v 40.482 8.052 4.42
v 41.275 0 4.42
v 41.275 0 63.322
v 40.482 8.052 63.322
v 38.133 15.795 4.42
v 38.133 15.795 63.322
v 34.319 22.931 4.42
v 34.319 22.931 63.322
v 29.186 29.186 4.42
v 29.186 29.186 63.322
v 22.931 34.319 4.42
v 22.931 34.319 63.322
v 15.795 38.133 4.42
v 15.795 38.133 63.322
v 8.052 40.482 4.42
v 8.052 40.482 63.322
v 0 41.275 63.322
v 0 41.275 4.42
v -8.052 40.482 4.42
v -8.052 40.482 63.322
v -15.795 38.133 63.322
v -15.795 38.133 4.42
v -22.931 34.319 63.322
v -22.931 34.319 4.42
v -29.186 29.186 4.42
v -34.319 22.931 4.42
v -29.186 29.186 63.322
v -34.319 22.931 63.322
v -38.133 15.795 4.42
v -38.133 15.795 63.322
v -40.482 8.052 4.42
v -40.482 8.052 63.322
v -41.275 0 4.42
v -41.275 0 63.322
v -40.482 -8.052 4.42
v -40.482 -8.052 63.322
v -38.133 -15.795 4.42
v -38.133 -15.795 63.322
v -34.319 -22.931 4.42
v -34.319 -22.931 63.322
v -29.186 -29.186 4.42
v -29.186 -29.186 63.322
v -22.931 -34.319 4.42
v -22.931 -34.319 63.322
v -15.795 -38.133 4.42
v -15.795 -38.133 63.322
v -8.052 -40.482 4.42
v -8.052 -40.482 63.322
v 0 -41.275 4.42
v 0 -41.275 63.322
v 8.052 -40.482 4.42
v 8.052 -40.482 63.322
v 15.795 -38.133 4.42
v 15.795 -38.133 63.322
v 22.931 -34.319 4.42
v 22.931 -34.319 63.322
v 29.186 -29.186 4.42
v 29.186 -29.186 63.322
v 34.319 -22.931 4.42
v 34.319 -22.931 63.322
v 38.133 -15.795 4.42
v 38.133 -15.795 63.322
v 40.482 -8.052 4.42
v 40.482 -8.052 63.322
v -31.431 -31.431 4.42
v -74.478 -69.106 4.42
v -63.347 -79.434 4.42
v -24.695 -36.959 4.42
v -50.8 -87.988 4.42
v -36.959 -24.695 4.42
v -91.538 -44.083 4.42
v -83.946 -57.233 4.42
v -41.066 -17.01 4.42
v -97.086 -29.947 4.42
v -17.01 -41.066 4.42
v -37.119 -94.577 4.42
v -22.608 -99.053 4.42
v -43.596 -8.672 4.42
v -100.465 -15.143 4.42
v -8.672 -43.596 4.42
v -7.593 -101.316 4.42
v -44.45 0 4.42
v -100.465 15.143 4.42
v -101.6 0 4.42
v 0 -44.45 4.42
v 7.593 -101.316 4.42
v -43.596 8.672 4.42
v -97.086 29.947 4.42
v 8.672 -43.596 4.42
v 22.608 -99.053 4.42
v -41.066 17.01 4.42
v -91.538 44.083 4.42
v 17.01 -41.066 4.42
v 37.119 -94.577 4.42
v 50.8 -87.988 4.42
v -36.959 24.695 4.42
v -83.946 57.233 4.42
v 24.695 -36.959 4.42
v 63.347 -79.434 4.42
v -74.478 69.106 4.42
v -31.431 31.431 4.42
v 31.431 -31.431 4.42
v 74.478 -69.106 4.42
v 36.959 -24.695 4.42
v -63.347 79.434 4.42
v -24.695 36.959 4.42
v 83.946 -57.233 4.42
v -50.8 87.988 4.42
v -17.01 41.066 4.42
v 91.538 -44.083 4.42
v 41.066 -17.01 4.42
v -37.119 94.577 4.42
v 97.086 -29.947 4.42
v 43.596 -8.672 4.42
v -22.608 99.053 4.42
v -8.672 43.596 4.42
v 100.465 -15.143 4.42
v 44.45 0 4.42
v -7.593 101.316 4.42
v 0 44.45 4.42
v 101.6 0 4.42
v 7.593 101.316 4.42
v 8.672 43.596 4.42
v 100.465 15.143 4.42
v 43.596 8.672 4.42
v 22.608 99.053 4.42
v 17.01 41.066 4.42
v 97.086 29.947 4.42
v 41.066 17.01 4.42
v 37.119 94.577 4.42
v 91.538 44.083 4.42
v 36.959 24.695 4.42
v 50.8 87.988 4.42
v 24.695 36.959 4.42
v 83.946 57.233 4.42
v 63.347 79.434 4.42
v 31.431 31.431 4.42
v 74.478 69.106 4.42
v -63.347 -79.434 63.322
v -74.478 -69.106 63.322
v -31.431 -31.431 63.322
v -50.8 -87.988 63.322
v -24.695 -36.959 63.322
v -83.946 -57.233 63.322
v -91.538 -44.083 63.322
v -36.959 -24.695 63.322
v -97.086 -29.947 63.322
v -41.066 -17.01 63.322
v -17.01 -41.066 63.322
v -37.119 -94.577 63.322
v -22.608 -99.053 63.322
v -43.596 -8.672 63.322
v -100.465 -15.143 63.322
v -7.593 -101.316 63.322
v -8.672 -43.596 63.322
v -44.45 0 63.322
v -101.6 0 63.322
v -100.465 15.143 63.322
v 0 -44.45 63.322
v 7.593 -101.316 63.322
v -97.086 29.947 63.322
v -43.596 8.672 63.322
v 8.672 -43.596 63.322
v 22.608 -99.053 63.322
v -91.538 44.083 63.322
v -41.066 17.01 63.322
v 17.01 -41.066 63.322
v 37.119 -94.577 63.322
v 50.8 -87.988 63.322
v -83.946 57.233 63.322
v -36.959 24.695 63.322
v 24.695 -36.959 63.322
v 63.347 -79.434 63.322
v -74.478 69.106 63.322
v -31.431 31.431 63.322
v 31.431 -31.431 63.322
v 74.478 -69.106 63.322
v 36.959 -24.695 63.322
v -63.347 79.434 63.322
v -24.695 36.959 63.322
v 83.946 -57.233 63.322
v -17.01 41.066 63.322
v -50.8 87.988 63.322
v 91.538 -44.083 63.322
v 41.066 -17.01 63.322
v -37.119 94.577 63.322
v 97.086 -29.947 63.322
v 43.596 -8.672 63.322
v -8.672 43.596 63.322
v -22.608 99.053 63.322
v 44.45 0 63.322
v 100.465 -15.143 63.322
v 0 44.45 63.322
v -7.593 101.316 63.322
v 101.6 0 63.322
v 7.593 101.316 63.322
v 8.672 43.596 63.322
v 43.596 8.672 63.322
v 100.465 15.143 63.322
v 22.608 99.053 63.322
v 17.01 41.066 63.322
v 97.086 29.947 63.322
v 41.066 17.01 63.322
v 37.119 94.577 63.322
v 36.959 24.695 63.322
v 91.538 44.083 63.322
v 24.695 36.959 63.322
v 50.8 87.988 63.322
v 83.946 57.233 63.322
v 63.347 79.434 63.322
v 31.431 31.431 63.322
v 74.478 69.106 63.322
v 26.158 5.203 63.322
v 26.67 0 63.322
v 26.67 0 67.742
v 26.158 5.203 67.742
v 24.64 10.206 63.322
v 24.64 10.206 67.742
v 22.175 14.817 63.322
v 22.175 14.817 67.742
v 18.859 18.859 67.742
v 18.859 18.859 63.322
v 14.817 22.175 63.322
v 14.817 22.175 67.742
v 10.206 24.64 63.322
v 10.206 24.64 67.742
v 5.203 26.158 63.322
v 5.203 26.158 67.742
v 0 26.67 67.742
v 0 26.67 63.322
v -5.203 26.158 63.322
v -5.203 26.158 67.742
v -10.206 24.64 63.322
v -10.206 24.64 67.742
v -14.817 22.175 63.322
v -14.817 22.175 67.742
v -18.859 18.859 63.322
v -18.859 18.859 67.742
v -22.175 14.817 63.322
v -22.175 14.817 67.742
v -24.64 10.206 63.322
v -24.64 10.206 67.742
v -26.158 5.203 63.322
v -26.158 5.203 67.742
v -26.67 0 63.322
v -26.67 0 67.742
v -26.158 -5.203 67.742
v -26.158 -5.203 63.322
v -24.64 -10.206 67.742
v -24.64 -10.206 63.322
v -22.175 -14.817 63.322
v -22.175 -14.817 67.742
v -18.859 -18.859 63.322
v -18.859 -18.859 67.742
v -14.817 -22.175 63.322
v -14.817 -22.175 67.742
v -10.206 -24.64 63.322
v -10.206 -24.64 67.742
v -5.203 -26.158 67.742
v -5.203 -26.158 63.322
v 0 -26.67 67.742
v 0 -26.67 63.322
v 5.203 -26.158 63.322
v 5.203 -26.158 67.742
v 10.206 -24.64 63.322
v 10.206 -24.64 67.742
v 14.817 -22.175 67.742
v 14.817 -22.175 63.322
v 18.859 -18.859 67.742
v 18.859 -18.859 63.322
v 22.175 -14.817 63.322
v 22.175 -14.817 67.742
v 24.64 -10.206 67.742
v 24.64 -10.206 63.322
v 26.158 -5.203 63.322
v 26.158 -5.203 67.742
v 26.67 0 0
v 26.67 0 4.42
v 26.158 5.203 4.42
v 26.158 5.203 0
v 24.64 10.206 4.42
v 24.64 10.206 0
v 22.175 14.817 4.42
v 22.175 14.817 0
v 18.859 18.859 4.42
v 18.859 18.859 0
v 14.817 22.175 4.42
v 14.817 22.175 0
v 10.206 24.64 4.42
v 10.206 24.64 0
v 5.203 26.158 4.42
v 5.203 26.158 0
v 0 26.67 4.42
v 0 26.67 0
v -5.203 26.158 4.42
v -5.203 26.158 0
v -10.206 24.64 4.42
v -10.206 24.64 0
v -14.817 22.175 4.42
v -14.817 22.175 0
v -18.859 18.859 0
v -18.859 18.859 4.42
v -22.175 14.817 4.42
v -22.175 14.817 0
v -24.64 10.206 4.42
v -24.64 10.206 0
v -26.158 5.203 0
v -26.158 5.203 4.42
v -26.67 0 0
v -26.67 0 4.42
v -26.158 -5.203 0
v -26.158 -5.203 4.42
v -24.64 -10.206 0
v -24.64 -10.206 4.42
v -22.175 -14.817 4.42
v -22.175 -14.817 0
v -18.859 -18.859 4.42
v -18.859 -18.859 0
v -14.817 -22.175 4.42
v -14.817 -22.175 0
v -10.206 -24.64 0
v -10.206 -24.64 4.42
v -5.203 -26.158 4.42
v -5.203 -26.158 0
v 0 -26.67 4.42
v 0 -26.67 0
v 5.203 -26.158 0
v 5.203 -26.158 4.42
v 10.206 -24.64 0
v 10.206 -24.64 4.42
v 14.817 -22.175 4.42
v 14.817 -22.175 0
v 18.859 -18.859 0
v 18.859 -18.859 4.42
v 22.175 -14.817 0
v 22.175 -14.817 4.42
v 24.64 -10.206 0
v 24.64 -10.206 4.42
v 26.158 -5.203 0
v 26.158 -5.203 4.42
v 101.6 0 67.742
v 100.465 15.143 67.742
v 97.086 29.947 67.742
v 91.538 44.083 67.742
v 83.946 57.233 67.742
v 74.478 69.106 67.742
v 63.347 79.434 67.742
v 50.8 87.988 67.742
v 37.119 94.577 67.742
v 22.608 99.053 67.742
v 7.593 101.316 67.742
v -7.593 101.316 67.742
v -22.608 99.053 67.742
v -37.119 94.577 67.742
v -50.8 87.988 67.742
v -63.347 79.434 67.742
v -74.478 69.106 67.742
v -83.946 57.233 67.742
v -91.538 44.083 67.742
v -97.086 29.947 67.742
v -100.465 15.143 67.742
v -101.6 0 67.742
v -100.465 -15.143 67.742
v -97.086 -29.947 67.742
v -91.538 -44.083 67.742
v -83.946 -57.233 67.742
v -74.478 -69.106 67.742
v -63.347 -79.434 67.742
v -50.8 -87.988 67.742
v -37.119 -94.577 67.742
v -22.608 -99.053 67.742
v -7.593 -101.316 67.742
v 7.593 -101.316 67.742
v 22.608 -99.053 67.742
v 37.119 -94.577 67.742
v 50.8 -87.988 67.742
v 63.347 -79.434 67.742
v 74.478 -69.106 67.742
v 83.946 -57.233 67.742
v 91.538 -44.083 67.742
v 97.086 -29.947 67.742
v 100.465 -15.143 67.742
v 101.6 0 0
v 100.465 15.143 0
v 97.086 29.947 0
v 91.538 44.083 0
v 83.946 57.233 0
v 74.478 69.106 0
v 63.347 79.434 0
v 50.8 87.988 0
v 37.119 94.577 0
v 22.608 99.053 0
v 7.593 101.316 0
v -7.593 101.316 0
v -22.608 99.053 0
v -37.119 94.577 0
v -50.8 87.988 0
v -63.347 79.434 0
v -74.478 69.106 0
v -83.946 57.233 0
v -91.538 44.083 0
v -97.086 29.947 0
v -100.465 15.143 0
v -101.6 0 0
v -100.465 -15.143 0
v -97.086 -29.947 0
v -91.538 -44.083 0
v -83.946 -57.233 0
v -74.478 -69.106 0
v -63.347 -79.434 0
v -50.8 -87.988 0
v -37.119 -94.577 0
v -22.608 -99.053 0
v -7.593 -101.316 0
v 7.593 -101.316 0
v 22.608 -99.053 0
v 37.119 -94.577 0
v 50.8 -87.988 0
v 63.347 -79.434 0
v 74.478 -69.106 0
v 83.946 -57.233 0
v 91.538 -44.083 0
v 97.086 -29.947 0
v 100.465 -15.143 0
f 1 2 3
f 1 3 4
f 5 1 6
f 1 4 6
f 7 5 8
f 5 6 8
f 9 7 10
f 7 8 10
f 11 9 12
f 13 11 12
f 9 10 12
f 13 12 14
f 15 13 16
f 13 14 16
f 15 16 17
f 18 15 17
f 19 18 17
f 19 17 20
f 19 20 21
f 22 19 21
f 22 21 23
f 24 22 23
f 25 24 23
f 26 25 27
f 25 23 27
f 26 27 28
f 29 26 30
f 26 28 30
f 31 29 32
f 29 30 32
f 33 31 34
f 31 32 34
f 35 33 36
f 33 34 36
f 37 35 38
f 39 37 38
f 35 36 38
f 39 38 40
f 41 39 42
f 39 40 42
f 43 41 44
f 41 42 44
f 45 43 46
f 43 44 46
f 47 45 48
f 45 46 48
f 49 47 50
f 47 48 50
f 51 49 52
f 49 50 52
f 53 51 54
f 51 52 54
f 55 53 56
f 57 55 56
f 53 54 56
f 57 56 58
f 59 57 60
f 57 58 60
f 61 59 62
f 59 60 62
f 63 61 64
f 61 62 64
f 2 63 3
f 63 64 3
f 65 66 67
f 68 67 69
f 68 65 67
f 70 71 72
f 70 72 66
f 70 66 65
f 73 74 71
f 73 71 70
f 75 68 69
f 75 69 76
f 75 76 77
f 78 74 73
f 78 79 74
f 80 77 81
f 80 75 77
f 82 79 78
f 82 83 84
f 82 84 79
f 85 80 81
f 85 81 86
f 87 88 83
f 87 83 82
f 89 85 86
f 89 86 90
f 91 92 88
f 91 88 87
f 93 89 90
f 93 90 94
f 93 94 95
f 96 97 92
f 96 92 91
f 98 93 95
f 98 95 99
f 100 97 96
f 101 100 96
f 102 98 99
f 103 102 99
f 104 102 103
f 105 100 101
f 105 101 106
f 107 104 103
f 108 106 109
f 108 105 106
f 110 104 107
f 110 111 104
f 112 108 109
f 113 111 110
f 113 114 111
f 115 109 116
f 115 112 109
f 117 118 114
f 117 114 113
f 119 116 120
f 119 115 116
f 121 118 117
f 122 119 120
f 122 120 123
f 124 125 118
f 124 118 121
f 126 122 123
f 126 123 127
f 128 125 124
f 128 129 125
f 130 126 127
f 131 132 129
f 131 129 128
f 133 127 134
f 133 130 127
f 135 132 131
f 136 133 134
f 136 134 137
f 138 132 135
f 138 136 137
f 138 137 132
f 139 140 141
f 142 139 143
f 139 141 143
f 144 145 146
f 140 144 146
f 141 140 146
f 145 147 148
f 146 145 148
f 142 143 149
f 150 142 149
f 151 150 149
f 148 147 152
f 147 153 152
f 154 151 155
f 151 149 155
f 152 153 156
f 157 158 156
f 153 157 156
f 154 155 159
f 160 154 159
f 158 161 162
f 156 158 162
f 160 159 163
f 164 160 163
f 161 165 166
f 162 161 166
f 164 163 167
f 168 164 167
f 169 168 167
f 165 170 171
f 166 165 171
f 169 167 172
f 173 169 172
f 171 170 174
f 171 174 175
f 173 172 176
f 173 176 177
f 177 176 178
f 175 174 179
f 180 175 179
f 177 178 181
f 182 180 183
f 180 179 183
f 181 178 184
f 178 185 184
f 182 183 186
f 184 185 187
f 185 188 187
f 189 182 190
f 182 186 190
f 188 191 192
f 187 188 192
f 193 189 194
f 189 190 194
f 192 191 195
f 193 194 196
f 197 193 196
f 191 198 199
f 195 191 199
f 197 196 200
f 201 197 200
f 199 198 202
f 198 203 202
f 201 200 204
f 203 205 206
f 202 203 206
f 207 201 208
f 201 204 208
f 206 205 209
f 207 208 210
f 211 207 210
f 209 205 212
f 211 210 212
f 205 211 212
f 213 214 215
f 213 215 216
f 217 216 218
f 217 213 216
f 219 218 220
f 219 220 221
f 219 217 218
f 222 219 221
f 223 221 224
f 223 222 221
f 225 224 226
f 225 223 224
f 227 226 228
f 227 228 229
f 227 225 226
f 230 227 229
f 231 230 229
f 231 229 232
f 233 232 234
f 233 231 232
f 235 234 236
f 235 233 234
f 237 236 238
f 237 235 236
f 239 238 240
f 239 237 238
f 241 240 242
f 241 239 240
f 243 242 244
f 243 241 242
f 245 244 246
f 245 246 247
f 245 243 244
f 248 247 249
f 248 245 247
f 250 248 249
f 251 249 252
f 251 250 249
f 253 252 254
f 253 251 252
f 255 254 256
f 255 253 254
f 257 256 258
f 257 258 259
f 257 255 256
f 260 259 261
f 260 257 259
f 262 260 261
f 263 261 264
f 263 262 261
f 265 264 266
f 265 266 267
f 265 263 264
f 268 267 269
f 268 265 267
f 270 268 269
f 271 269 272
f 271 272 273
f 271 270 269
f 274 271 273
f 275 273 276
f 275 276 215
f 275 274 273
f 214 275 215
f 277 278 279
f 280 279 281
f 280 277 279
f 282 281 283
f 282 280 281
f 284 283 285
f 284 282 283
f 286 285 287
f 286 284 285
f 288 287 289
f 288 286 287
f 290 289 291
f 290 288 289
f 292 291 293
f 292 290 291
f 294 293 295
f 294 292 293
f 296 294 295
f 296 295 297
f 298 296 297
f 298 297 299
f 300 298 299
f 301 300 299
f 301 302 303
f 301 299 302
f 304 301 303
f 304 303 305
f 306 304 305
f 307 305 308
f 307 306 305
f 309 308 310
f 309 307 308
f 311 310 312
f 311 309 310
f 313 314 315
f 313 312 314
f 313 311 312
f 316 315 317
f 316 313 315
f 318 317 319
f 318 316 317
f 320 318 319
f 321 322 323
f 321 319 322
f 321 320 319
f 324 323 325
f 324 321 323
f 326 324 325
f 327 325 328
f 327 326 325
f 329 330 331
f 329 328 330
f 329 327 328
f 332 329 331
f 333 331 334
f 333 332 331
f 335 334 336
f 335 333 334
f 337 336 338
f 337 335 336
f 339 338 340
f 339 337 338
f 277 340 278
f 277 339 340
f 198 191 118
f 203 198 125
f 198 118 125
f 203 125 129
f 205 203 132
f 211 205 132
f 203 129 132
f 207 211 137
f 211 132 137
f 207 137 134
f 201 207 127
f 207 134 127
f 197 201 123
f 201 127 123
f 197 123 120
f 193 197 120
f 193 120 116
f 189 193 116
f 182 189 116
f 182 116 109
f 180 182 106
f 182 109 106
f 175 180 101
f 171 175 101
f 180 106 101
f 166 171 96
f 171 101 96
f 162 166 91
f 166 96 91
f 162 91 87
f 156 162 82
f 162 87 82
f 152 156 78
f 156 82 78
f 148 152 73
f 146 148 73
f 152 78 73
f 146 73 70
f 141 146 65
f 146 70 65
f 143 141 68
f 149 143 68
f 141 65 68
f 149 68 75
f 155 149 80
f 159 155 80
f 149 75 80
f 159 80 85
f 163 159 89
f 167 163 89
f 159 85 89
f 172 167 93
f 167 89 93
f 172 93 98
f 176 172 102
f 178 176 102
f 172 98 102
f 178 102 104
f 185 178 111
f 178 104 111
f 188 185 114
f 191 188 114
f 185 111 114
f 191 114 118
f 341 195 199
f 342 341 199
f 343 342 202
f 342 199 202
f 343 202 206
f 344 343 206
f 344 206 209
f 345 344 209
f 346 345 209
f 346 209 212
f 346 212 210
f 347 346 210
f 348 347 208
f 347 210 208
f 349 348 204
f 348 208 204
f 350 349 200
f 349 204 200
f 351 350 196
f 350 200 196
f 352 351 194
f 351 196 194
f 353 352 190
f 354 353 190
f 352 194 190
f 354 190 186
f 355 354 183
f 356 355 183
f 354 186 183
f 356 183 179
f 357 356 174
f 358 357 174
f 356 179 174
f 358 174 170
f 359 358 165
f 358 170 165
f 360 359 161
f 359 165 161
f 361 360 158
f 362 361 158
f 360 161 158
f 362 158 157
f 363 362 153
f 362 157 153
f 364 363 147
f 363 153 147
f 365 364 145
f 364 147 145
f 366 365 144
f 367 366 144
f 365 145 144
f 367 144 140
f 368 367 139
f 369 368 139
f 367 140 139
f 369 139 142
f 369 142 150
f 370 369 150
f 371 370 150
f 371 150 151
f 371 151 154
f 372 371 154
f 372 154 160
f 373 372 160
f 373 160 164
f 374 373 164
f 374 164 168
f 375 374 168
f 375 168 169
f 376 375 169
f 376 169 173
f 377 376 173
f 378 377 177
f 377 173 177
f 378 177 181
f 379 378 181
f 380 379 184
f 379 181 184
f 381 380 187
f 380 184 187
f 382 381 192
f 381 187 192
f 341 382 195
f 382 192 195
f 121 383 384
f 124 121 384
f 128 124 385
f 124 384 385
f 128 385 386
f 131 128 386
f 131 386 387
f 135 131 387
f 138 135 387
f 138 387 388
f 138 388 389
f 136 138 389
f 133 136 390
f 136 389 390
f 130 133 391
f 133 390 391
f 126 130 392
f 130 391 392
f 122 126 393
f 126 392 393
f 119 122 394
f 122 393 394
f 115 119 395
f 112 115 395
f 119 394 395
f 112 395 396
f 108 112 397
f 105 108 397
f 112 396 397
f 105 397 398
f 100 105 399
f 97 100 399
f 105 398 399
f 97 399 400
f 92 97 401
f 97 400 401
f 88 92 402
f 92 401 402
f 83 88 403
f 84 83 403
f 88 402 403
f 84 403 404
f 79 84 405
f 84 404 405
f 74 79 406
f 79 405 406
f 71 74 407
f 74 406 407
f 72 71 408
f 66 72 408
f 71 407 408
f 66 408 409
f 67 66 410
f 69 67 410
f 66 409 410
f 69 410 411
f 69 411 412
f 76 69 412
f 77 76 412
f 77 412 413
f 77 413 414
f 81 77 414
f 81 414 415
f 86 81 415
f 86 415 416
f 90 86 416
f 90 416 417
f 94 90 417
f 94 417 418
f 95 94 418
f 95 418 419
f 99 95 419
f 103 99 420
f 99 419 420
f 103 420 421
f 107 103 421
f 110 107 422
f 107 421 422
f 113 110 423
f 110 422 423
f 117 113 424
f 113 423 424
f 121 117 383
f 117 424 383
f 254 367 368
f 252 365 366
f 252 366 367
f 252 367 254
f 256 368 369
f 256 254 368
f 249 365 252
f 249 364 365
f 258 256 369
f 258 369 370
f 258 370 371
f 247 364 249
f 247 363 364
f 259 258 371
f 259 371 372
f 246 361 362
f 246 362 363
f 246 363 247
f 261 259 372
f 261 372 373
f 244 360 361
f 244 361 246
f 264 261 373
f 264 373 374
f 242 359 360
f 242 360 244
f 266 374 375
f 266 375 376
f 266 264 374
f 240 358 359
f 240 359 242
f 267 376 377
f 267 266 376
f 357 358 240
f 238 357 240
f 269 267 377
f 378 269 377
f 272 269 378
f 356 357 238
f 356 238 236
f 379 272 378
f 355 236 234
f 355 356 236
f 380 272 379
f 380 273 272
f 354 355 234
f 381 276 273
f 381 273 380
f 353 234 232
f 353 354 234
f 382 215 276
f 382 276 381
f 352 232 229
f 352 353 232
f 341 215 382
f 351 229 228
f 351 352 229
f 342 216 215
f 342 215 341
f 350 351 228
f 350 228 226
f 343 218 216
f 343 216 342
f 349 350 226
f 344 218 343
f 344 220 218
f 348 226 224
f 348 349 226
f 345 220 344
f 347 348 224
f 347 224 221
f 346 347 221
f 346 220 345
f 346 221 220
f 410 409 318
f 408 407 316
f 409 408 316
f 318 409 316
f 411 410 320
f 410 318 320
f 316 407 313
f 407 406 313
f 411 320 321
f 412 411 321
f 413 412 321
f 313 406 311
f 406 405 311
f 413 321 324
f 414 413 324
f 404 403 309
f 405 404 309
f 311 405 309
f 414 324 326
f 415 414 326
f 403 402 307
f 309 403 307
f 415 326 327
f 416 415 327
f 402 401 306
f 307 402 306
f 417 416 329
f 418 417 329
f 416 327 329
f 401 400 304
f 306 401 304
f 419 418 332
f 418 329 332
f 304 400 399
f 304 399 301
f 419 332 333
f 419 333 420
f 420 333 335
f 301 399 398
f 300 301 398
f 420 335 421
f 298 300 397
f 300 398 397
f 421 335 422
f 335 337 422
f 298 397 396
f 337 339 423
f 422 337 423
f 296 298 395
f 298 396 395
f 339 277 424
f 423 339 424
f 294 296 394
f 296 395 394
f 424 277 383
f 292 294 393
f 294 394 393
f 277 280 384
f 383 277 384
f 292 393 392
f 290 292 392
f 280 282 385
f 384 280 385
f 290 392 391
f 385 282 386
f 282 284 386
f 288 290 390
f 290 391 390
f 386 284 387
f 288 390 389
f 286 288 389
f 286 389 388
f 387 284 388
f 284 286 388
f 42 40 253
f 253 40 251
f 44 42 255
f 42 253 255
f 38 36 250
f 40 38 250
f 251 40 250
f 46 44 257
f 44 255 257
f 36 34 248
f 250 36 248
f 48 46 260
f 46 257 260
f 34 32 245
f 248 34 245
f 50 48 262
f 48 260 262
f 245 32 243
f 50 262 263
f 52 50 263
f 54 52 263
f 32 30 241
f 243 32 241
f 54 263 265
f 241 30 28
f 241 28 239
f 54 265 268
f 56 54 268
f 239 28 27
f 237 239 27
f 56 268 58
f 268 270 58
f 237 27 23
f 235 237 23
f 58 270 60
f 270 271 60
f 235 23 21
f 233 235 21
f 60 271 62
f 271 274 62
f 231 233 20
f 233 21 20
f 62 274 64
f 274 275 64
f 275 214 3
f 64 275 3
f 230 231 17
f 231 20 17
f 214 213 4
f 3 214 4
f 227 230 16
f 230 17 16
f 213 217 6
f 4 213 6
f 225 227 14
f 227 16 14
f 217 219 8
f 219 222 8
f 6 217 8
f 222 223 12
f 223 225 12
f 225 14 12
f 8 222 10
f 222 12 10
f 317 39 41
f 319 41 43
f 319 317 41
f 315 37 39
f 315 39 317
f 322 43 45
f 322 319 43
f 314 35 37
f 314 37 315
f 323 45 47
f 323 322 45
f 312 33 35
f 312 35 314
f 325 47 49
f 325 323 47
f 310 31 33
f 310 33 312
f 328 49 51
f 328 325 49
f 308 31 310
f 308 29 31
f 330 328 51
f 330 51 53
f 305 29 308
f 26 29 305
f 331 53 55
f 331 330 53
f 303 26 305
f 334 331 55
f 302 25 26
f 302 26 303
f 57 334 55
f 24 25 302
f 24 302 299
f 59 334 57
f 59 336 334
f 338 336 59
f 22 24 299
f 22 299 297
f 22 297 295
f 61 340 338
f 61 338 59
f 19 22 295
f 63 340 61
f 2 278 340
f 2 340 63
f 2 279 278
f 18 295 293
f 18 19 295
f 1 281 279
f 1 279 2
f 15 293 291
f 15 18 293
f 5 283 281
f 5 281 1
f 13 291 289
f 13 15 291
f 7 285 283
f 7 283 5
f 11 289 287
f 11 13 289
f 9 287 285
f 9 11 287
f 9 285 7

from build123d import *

# Parameters (mm, degrees)
F0_R     = 101.6
F0_R_2   = 26.67
F1_DEPTH = 4.4196
F2_R     = 44.45
F2_R_2   = 26.67
F3_DEPTH = 58.9026
F5_DEPTH = 58.9026
F6_R     = 101.6
F6_R_2   = 44.45
F6_R_3   = 41.275
F6_R_4   = 26.67
F7_DEPTH = 4.4196


with BuildPart() as f1:
    # F0 (on Top) → F1 (new body)
    with BuildSketch(Plane.XY):
        Circle(F0_R)
        Circle(F0_R_2, mode=Mode.SUBTRACT)
    extrude(amount=F1_DEPTH)

    # F2 (on face) → F3 (join)
    with BuildSketch(Plane.XY.offset(4.4196)):
        Circle(F2_R)
        Circle(F2_R_2, mode=Mode.SUBTRACT)
    extrude(amount=F3_DEPTH)

    # F4 (on face) → F5 (cut, through all)
    with BuildSketch(Plane.XY.offset(63.3222)):
        with BuildLine():
            ThreePointArc((-41.275, 0), (0, -41.275), (41.275, 0))
            ThreePointArc((41.275, 0), (0, 41.275), (-41.275, 0))
        make_face()
    extrude(amount=-F5_DEPTH, mode=Mode.SUBTRACT)

    # F6 (on face) → F7 (join)
    with BuildSketch(Plane.XY.offset(63.3222)):
        Circle(F6_R)
        Circle(F6_R_2, mode=Mode.SUBTRACT)
        Circle(F6_R_2)
        Circle(F6_R_3, mode=Mode.SUBTRACT)
        Circle(F6_R_3)
        Circle(F6_R_4, mode=Mode.SUBTRACT)
    extrude(amount=F7_DEPTH)


solid = f1.part
